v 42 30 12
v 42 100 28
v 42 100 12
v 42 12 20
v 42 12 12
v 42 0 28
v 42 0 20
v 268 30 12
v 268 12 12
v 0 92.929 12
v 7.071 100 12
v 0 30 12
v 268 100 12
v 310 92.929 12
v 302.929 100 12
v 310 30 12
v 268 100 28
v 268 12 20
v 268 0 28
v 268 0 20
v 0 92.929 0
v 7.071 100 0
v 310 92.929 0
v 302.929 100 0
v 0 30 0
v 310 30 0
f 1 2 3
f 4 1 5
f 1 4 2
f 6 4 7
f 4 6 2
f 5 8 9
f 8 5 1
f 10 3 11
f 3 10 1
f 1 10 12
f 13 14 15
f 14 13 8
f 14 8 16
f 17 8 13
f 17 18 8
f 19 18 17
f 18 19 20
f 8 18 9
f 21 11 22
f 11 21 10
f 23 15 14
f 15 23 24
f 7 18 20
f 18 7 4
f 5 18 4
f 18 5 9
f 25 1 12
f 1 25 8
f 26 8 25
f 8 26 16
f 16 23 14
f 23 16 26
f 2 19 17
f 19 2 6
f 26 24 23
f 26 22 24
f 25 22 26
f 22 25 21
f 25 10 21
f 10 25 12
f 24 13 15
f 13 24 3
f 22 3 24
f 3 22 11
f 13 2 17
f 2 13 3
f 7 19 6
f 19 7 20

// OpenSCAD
include <../src/wardrobe.scad>;
plank_zx_front_side();
//github_openscad -o wardrobe_2/plank_zx_front_side.stl -D wardrobe_n=2 -D cutting_edge=0 -D break_view_length=0 wardrobe_2/plank_zx_front_side_stl.scad
